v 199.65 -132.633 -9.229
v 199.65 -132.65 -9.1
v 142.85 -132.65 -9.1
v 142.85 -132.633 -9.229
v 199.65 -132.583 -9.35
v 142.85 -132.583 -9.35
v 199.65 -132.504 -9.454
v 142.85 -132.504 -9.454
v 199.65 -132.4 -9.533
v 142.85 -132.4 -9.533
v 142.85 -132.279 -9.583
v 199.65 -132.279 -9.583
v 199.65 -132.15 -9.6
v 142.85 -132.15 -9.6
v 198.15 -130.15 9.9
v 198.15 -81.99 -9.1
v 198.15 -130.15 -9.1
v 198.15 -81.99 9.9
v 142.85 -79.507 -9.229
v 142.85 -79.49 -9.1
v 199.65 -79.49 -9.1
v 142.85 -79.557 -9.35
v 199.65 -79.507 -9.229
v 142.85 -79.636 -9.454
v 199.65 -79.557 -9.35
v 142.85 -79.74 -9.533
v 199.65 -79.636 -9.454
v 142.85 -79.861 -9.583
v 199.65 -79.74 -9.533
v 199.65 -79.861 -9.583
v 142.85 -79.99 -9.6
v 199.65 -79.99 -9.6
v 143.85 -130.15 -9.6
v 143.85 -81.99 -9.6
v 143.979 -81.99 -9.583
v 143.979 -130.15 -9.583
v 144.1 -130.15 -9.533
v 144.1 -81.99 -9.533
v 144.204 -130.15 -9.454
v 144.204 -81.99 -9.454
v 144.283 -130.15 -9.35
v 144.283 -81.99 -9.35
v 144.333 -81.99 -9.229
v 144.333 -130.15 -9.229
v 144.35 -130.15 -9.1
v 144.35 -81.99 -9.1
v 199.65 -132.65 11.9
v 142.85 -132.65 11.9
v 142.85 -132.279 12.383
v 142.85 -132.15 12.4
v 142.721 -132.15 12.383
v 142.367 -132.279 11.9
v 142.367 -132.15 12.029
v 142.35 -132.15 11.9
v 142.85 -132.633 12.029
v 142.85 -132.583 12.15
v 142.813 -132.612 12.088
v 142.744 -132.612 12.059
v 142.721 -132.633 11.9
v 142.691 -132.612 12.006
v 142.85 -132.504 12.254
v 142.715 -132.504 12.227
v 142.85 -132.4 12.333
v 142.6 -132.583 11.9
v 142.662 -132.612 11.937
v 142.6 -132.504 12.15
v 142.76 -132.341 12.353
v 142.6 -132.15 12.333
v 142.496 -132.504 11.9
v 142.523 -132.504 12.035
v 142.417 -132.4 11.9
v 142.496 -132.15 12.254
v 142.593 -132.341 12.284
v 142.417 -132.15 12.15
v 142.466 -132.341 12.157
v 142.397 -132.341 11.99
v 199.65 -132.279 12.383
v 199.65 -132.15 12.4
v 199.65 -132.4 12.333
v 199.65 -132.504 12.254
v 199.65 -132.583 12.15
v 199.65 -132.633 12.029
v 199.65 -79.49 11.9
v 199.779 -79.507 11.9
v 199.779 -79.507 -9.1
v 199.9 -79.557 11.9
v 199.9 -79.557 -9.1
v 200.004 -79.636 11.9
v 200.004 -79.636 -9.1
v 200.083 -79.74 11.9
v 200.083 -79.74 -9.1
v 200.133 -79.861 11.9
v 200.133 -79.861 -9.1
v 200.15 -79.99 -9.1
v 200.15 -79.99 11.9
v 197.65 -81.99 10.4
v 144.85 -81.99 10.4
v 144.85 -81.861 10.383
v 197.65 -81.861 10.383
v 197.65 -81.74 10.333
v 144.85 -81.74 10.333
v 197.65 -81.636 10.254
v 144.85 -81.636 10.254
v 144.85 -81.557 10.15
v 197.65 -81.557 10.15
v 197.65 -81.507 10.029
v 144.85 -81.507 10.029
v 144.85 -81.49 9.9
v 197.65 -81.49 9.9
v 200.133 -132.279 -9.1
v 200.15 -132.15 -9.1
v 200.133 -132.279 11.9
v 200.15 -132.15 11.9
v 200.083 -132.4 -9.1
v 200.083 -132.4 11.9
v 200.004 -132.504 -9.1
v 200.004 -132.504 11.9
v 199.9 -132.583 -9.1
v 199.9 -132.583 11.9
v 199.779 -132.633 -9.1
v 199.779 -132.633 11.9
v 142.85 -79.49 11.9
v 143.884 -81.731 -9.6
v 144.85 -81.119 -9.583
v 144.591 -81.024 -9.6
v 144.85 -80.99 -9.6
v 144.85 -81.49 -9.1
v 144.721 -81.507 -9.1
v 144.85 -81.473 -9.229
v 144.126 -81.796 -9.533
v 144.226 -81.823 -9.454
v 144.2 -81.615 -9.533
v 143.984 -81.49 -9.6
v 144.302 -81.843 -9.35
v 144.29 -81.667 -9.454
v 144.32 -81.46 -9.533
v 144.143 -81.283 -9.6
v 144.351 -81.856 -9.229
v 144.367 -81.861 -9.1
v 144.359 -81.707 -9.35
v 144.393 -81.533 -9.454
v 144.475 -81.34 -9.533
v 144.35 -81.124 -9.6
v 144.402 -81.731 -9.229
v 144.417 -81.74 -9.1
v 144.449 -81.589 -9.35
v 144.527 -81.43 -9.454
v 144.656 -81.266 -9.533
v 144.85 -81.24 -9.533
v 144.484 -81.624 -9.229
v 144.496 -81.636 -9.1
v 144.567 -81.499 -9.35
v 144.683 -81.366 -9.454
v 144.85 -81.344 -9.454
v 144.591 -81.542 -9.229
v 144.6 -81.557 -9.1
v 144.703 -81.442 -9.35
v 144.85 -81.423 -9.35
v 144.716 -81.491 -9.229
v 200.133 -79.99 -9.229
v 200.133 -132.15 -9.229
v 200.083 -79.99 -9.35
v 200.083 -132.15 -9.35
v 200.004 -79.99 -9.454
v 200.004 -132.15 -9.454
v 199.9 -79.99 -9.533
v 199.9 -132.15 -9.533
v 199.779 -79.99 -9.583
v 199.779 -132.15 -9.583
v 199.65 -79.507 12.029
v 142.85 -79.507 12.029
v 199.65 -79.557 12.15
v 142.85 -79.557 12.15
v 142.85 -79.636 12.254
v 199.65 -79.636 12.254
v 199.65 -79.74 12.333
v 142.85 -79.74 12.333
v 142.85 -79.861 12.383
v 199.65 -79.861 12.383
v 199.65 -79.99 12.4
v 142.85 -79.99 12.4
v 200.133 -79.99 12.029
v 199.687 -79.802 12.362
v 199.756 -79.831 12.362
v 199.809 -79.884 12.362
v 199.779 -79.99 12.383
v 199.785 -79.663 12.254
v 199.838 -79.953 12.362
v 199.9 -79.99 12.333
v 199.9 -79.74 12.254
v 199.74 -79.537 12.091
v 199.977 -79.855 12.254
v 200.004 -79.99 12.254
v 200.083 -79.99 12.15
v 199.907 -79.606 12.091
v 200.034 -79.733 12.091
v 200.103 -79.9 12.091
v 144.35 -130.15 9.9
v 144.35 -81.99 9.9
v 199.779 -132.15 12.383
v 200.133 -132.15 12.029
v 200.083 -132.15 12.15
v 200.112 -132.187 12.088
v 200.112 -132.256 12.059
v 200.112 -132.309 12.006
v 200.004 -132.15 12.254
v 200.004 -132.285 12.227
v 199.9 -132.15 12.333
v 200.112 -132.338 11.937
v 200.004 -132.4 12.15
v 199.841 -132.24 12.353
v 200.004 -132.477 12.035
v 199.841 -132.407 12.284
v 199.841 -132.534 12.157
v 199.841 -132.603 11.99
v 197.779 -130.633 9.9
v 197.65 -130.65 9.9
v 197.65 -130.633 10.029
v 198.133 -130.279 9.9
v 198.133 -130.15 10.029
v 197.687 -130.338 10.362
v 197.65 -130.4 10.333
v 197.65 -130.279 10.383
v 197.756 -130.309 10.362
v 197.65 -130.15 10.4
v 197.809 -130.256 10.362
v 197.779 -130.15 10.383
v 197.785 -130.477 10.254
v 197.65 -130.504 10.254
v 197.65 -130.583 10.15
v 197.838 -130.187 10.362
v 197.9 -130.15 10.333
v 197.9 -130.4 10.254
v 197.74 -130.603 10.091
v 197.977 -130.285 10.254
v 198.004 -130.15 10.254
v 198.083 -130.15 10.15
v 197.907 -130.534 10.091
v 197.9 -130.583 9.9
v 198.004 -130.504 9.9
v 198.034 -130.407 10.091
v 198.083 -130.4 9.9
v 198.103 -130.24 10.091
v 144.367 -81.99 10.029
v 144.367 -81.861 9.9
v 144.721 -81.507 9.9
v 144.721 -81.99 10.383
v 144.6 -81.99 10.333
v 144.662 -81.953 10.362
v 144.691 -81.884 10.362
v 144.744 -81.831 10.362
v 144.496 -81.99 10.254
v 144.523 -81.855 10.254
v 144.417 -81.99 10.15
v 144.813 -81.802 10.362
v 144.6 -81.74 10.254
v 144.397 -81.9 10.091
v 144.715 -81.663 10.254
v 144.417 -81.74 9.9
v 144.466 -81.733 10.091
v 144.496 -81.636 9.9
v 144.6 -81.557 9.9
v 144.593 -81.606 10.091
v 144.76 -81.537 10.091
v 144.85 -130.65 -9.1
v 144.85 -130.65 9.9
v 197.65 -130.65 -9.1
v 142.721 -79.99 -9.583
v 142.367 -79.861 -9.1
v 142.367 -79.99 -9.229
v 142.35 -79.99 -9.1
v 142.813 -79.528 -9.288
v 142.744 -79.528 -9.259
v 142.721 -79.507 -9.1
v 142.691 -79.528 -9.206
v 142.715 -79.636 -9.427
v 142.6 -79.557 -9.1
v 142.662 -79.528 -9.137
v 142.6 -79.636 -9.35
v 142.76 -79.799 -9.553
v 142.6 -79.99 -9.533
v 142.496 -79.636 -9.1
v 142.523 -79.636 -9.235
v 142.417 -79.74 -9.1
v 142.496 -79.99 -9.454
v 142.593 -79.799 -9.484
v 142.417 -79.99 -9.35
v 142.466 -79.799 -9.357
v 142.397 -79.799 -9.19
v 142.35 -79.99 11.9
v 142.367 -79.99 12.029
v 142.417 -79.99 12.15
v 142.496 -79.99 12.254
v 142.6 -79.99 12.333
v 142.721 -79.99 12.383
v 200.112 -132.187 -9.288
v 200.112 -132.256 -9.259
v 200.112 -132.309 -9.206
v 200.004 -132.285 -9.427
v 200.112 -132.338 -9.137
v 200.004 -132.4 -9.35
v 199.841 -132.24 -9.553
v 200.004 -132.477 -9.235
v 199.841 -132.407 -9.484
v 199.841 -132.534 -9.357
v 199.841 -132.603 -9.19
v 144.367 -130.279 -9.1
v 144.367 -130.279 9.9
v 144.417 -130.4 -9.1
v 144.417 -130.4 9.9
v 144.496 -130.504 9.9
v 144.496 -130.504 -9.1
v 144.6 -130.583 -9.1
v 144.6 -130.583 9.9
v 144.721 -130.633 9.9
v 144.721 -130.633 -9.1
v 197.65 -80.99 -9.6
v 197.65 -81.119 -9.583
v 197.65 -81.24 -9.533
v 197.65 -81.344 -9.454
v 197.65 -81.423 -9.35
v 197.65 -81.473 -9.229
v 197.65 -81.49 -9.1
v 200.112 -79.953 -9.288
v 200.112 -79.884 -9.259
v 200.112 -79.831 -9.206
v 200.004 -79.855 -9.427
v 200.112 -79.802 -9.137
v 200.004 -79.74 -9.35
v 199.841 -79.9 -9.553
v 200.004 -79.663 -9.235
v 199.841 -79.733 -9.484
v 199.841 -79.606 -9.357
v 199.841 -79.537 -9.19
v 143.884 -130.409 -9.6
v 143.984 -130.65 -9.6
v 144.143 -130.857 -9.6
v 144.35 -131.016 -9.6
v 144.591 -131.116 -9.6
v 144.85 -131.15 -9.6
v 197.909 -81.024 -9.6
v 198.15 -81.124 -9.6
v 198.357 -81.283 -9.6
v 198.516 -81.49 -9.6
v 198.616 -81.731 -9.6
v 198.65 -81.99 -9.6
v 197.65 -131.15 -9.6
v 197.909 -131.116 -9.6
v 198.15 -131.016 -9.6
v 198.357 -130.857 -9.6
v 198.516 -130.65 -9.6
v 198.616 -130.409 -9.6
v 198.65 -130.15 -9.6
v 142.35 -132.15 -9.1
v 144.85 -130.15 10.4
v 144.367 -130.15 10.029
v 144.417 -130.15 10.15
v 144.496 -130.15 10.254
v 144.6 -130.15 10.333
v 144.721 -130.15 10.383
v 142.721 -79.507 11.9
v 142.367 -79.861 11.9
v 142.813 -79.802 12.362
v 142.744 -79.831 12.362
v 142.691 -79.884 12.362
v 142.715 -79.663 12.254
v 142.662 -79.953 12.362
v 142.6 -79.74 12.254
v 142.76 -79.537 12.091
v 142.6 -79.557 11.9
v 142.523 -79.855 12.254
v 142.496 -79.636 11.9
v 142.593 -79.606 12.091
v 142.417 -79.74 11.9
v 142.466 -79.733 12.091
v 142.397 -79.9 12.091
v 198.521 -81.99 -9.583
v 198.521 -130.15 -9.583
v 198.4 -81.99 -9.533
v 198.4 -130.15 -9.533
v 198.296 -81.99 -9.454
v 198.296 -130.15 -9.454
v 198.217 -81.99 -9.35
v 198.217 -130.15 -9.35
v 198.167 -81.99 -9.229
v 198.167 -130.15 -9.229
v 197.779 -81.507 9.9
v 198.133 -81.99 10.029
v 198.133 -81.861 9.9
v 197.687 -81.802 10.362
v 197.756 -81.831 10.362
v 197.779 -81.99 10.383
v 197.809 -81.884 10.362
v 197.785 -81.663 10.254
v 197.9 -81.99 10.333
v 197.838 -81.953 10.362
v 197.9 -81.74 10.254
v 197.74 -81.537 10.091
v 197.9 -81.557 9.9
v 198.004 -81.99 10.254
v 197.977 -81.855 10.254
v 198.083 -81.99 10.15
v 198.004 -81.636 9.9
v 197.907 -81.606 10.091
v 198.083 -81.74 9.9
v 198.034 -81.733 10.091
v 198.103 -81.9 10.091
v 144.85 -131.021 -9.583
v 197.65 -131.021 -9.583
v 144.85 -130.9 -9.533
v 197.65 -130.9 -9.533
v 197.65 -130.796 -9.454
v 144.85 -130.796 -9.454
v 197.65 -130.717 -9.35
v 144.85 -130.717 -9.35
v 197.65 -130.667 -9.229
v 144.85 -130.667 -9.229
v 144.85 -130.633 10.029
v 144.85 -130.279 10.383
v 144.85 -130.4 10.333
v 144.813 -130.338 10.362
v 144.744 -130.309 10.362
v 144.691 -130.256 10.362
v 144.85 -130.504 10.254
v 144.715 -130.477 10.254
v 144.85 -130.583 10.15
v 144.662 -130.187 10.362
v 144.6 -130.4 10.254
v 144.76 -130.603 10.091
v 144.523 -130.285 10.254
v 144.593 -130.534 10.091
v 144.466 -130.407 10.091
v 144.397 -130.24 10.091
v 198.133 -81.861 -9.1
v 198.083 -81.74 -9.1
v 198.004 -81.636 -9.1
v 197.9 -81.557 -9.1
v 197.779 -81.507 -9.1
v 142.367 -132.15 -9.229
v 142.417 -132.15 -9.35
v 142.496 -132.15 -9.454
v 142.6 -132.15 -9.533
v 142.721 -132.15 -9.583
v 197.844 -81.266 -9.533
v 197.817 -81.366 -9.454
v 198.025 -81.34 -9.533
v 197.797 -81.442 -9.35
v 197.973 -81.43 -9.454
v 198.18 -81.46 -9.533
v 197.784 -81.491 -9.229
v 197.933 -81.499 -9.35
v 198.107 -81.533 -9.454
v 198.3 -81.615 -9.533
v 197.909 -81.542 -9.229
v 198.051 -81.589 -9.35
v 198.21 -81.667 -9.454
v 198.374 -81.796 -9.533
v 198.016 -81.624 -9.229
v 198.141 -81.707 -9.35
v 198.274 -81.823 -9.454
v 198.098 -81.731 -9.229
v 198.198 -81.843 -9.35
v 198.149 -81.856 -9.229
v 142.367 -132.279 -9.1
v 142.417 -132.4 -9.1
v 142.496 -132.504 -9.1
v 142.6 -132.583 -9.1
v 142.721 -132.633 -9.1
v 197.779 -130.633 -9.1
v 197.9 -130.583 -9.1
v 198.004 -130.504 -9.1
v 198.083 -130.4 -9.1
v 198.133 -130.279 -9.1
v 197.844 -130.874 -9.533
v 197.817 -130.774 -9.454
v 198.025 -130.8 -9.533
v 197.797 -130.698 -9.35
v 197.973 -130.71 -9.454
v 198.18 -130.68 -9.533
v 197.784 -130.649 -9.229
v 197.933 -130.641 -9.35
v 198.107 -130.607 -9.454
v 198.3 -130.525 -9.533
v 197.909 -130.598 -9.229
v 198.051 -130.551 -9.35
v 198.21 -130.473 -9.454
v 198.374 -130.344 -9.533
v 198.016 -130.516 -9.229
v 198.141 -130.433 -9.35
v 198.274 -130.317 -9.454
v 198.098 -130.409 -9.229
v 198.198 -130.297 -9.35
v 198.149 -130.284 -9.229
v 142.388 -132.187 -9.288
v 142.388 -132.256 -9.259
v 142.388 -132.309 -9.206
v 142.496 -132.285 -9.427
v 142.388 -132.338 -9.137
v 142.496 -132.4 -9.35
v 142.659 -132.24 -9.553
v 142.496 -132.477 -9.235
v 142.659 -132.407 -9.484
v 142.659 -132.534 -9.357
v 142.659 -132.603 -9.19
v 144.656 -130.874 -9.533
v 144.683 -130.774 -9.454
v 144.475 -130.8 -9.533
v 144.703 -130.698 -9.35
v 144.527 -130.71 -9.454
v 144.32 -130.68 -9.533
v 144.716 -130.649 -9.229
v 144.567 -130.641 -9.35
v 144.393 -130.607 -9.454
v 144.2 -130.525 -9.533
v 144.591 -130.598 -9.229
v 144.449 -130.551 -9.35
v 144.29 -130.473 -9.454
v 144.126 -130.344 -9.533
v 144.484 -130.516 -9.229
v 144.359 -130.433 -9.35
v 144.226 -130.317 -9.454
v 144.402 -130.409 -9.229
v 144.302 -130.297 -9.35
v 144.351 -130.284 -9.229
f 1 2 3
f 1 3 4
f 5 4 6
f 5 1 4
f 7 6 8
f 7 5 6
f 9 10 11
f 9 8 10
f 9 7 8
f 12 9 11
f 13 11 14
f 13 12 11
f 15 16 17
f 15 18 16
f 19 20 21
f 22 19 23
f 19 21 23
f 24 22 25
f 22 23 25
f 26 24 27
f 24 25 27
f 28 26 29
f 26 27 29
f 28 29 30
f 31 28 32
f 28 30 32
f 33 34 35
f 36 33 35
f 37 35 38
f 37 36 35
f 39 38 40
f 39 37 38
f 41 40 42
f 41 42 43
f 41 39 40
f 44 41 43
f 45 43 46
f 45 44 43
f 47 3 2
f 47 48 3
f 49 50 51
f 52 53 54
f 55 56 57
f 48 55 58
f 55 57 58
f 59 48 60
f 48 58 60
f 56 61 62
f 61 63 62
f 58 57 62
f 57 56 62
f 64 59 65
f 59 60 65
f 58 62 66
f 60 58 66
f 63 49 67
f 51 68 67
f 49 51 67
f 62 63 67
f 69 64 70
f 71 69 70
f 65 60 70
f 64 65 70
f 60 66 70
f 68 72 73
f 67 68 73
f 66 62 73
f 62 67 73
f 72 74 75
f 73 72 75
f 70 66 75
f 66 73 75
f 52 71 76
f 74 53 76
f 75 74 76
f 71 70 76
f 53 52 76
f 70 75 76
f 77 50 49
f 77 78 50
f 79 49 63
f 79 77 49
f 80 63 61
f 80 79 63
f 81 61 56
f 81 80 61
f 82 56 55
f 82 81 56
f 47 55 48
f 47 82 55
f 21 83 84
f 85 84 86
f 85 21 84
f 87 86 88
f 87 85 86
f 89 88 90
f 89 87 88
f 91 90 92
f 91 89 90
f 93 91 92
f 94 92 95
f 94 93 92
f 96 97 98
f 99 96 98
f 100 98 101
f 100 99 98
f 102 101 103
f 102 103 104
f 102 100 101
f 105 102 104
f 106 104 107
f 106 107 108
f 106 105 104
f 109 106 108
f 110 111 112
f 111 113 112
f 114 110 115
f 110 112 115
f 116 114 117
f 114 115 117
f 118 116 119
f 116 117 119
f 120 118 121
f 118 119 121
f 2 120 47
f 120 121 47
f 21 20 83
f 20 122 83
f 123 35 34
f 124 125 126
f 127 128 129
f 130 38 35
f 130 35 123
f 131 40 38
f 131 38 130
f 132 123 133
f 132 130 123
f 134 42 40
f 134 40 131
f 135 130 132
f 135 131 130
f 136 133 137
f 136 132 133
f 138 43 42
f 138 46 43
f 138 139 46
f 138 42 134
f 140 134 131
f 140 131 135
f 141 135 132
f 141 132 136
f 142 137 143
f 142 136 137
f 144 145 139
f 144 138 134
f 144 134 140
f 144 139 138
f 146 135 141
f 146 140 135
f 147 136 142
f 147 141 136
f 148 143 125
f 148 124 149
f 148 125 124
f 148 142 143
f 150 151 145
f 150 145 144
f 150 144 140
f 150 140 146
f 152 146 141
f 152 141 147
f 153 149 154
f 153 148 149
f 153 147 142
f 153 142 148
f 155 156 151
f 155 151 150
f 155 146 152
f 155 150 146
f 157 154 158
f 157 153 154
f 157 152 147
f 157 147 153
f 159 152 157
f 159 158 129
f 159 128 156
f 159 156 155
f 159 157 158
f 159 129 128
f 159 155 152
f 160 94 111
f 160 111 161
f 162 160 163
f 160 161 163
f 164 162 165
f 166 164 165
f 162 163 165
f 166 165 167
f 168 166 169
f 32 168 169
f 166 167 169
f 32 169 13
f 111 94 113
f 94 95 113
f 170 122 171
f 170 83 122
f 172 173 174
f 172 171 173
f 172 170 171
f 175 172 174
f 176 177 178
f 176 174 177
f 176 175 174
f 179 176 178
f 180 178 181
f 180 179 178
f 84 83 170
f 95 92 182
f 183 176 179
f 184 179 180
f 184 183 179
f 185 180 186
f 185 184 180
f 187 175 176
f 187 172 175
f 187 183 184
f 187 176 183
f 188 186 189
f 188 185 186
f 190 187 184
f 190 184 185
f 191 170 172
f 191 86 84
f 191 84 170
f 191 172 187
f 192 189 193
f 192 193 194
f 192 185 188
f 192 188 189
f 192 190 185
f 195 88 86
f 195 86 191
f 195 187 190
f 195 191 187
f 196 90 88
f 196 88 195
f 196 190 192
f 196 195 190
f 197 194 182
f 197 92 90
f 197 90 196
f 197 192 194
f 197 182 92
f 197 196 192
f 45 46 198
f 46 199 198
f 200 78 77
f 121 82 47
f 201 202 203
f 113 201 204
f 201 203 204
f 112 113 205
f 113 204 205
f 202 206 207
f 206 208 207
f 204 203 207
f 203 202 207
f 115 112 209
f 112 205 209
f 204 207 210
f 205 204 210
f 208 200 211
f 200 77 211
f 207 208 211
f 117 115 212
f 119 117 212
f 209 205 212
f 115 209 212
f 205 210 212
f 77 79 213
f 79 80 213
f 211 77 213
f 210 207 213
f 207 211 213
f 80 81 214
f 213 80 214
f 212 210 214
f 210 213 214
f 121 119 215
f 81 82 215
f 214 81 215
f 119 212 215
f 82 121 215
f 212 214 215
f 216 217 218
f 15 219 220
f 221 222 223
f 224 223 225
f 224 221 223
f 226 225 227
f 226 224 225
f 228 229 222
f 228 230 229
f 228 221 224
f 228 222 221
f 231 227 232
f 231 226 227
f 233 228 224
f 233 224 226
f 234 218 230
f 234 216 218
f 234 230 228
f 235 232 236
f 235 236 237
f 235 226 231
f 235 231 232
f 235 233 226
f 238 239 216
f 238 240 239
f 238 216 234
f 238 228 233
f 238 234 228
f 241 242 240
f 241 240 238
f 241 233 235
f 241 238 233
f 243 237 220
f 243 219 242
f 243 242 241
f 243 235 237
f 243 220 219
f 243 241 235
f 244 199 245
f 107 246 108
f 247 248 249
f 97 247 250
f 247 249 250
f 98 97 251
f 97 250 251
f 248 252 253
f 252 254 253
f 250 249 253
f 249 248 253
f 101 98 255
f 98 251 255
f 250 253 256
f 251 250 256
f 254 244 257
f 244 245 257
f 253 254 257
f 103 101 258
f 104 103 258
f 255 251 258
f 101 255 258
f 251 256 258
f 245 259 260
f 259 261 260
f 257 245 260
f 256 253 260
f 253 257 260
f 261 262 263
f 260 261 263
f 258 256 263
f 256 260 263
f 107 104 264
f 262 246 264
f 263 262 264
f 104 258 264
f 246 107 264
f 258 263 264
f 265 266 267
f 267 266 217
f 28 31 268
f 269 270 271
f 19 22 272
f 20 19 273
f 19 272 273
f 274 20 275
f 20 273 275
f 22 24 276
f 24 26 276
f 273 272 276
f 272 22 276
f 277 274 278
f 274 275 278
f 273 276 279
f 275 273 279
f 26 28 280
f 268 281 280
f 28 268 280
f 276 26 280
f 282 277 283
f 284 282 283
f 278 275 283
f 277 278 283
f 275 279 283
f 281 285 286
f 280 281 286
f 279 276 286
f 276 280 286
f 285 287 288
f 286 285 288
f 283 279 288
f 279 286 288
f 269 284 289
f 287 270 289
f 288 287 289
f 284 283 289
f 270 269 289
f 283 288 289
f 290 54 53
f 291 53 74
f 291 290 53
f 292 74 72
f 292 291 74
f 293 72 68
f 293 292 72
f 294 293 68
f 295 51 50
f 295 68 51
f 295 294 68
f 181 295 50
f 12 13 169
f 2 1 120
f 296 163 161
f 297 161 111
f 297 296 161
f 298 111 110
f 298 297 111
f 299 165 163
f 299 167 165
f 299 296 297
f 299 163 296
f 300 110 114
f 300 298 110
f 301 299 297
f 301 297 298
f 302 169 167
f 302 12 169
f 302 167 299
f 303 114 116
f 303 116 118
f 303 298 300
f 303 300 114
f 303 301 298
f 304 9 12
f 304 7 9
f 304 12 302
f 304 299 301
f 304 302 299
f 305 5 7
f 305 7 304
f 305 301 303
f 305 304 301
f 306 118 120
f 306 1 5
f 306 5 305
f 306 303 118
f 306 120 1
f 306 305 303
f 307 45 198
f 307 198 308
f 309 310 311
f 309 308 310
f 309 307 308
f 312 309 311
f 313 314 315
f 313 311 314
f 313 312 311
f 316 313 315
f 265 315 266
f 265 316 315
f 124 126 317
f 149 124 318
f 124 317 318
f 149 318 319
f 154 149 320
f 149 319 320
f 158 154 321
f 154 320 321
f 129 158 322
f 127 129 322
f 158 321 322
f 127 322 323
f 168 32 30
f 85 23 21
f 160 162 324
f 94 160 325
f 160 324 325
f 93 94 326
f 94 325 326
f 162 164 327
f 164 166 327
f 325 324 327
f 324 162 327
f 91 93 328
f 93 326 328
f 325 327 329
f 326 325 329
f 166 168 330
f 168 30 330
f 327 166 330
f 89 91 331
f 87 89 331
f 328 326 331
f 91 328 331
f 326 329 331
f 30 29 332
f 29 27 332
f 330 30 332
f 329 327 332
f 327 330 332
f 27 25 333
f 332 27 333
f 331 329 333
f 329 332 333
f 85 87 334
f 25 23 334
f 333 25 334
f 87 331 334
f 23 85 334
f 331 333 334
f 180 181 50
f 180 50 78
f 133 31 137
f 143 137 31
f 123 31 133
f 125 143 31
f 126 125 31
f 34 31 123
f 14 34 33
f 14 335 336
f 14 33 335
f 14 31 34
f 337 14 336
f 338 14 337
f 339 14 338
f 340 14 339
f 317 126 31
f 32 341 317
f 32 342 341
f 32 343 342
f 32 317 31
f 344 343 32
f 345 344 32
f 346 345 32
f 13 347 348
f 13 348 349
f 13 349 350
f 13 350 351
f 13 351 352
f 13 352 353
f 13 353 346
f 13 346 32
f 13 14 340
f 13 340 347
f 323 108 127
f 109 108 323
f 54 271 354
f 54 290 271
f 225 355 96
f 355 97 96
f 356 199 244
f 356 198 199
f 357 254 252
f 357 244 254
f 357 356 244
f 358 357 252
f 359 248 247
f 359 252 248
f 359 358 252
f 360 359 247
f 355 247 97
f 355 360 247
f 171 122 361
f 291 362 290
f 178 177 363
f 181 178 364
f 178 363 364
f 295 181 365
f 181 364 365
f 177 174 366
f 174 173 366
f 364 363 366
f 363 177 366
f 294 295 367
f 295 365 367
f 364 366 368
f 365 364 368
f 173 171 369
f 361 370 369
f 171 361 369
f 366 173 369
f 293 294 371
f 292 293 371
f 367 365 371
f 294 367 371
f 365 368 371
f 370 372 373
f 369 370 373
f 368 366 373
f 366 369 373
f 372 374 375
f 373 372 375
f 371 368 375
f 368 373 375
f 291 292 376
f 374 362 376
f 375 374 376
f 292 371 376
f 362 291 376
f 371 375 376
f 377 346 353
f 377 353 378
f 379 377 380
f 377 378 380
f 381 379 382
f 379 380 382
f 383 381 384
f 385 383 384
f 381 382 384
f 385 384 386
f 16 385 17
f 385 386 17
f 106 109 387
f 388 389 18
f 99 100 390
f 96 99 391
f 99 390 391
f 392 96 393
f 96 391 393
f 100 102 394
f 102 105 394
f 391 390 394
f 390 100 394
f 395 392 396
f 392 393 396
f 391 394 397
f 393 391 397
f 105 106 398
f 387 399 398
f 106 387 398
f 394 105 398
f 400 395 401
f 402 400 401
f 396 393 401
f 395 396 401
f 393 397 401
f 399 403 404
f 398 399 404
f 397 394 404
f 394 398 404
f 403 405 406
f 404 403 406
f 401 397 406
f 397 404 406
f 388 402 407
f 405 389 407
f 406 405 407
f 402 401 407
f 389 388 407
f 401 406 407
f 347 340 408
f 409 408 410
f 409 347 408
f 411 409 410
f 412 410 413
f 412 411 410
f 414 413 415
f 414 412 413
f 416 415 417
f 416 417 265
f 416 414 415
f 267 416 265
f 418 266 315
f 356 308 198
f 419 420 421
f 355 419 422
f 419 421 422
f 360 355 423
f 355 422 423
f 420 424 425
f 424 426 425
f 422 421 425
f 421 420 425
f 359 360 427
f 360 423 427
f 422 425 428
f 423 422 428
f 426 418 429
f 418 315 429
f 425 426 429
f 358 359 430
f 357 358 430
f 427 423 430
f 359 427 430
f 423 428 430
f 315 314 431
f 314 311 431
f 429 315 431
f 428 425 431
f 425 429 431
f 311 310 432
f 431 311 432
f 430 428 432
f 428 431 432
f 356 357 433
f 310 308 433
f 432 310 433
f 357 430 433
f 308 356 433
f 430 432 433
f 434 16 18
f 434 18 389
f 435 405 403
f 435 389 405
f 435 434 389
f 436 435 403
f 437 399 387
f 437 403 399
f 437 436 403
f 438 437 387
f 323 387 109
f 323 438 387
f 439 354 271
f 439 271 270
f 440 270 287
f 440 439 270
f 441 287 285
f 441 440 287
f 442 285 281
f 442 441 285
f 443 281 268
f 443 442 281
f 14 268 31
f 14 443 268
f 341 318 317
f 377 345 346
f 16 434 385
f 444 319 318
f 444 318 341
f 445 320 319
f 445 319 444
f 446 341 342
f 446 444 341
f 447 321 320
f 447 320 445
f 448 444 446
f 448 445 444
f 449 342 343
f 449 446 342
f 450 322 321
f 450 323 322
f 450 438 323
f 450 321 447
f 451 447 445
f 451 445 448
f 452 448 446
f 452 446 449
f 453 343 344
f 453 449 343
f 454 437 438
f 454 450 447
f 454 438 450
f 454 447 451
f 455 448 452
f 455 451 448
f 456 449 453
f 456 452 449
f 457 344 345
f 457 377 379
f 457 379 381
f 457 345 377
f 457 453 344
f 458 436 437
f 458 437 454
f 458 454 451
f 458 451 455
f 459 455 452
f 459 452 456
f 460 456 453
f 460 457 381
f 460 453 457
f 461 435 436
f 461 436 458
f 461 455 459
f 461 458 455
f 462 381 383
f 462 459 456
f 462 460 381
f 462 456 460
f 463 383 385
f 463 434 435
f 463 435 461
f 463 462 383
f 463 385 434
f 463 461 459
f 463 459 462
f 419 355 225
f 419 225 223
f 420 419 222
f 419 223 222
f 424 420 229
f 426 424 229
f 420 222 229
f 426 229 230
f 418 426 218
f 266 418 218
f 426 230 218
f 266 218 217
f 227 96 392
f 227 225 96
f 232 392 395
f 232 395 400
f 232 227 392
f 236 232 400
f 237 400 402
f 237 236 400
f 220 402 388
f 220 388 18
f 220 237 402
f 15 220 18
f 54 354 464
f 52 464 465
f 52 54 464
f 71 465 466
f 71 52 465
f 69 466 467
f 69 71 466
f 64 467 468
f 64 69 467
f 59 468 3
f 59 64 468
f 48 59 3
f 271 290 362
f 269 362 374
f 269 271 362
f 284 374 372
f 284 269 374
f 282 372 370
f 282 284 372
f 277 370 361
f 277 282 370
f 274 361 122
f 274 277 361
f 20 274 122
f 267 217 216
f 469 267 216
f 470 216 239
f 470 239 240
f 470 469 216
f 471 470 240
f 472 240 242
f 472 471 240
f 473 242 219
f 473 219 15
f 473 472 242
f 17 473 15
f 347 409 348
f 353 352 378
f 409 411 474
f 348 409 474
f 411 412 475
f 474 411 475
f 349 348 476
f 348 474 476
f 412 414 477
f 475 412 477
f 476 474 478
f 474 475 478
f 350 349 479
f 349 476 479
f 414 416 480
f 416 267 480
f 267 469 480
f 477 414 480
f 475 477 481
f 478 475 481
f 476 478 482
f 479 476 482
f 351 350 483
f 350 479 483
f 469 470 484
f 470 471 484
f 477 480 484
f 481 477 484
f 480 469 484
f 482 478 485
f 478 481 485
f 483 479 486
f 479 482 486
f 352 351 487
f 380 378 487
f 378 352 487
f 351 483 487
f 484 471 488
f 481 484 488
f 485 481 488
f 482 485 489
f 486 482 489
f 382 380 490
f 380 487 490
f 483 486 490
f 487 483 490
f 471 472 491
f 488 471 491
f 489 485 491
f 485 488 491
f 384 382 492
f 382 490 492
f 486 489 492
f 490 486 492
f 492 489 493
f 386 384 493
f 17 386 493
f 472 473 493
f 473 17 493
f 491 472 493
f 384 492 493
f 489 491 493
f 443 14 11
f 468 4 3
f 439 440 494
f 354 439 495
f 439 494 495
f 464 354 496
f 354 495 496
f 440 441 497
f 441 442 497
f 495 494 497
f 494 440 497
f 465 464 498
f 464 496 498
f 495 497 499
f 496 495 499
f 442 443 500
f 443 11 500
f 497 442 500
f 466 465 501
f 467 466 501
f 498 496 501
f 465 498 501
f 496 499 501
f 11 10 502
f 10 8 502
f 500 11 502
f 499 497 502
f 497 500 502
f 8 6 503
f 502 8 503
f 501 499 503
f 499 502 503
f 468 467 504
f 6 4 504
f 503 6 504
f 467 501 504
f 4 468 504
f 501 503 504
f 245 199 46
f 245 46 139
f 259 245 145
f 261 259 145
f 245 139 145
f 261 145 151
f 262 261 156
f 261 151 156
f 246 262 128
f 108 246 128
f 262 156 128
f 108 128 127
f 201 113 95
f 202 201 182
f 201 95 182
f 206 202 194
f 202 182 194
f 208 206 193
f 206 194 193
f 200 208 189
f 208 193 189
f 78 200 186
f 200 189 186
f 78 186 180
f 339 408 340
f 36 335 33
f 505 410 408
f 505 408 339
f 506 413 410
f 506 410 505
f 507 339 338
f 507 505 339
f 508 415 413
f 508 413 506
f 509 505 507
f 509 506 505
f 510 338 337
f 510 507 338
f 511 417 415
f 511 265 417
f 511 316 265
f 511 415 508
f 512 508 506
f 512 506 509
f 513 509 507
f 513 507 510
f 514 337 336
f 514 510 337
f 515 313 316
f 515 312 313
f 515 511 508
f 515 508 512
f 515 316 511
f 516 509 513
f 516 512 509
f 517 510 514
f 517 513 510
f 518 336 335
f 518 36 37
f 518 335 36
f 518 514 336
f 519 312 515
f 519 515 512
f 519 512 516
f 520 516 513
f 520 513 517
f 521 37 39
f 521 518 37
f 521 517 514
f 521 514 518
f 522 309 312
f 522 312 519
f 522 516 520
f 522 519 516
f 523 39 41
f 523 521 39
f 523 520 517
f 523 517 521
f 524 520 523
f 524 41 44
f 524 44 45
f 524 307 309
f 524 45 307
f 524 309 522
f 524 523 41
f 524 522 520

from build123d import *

# Parameters (mm, degrees)
SKETCH003_W   = 57.8
SKETCH003_H   = 53.16
PAD002_DEPTH  = 2
SKETCH004_W   = 57.8
SKETCH004_H   = 53.16
SKETCH004_W_2 = 53.8
SKETCH004_H_2 = 49.16
PAD003_DEPTH  = 20
FILLET_R      = 0.5


with BuildPart() as part:
    # Sketch003 (on Face23 of ShapeBinder001) → Pad002 (new body)
    with BuildSketch(Plane.XY.offset(10.4)):
        with Locations((171.25, -106.07)):
            Rectangle(SKETCH003_W, SKETCH003_H)
    extrude(amount=PAD002_DEPTH)

    # Sketch004 (on Face5 of Pad002) → Pad003 (join)
    with BuildSketch(Plane(origin=(0, 0, 10.4), x_dir=(1, 0, 0), z_dir=(0, 0, -1))):
        with Locations((171.25, 106.07)):
            Rectangle(SKETCH004_W, SKETCH004_H)
        with Locations((171.25, 106.07)):
            Rectangle(SKETCH004_W_2, SKETCH004_H_2, mode=Mode.SUBTRACT)
    extrude(amount=PAD003_DEPTH)

    # Fillet
    fillet_edges = [part.edges().sort_by_distance(p)[0] for p in [
        (171.25, -132.65, -9.6),
        (142.35, -106.07, -9.6),
        (171.25, -79.49, -9.6),
        (200.15, -106.07, -9.6),
        (171.25, -130.65, -9.6),
        (144.35, -106.07, -9.6),
        (171.25, -81.49, -9.6),
        (198.15, -106.07, -9.6),
        (198.15, -130.65, 0.4),
        (144.35, -130.65, 0.4),
        (171.25, -130.65, 10.4),
        (144.35, -81.49, 0.4),
        (144.35, -106.07, 10.4),
        (198.15, -81.49, 0.4),
        (171.25, -81.49, 10.4),
        (198.15, -106.07, 10.4),
        (200.15, -79.49, 1.4),
        (142.35, -79.49, 1.4),
        (171.25, -79.49, 12.4),
        (142.35, -106.07, 12.4),
        (171.25, -132.65, 12.4),
        (200.15, -106.07, 12.4),
        (200.15, -132.65, 1.4),
        (142.35, -132.65, 1.4),
    ]]
    fillet(fillet_edges, radius=FILLET_R)


solid = part.part
